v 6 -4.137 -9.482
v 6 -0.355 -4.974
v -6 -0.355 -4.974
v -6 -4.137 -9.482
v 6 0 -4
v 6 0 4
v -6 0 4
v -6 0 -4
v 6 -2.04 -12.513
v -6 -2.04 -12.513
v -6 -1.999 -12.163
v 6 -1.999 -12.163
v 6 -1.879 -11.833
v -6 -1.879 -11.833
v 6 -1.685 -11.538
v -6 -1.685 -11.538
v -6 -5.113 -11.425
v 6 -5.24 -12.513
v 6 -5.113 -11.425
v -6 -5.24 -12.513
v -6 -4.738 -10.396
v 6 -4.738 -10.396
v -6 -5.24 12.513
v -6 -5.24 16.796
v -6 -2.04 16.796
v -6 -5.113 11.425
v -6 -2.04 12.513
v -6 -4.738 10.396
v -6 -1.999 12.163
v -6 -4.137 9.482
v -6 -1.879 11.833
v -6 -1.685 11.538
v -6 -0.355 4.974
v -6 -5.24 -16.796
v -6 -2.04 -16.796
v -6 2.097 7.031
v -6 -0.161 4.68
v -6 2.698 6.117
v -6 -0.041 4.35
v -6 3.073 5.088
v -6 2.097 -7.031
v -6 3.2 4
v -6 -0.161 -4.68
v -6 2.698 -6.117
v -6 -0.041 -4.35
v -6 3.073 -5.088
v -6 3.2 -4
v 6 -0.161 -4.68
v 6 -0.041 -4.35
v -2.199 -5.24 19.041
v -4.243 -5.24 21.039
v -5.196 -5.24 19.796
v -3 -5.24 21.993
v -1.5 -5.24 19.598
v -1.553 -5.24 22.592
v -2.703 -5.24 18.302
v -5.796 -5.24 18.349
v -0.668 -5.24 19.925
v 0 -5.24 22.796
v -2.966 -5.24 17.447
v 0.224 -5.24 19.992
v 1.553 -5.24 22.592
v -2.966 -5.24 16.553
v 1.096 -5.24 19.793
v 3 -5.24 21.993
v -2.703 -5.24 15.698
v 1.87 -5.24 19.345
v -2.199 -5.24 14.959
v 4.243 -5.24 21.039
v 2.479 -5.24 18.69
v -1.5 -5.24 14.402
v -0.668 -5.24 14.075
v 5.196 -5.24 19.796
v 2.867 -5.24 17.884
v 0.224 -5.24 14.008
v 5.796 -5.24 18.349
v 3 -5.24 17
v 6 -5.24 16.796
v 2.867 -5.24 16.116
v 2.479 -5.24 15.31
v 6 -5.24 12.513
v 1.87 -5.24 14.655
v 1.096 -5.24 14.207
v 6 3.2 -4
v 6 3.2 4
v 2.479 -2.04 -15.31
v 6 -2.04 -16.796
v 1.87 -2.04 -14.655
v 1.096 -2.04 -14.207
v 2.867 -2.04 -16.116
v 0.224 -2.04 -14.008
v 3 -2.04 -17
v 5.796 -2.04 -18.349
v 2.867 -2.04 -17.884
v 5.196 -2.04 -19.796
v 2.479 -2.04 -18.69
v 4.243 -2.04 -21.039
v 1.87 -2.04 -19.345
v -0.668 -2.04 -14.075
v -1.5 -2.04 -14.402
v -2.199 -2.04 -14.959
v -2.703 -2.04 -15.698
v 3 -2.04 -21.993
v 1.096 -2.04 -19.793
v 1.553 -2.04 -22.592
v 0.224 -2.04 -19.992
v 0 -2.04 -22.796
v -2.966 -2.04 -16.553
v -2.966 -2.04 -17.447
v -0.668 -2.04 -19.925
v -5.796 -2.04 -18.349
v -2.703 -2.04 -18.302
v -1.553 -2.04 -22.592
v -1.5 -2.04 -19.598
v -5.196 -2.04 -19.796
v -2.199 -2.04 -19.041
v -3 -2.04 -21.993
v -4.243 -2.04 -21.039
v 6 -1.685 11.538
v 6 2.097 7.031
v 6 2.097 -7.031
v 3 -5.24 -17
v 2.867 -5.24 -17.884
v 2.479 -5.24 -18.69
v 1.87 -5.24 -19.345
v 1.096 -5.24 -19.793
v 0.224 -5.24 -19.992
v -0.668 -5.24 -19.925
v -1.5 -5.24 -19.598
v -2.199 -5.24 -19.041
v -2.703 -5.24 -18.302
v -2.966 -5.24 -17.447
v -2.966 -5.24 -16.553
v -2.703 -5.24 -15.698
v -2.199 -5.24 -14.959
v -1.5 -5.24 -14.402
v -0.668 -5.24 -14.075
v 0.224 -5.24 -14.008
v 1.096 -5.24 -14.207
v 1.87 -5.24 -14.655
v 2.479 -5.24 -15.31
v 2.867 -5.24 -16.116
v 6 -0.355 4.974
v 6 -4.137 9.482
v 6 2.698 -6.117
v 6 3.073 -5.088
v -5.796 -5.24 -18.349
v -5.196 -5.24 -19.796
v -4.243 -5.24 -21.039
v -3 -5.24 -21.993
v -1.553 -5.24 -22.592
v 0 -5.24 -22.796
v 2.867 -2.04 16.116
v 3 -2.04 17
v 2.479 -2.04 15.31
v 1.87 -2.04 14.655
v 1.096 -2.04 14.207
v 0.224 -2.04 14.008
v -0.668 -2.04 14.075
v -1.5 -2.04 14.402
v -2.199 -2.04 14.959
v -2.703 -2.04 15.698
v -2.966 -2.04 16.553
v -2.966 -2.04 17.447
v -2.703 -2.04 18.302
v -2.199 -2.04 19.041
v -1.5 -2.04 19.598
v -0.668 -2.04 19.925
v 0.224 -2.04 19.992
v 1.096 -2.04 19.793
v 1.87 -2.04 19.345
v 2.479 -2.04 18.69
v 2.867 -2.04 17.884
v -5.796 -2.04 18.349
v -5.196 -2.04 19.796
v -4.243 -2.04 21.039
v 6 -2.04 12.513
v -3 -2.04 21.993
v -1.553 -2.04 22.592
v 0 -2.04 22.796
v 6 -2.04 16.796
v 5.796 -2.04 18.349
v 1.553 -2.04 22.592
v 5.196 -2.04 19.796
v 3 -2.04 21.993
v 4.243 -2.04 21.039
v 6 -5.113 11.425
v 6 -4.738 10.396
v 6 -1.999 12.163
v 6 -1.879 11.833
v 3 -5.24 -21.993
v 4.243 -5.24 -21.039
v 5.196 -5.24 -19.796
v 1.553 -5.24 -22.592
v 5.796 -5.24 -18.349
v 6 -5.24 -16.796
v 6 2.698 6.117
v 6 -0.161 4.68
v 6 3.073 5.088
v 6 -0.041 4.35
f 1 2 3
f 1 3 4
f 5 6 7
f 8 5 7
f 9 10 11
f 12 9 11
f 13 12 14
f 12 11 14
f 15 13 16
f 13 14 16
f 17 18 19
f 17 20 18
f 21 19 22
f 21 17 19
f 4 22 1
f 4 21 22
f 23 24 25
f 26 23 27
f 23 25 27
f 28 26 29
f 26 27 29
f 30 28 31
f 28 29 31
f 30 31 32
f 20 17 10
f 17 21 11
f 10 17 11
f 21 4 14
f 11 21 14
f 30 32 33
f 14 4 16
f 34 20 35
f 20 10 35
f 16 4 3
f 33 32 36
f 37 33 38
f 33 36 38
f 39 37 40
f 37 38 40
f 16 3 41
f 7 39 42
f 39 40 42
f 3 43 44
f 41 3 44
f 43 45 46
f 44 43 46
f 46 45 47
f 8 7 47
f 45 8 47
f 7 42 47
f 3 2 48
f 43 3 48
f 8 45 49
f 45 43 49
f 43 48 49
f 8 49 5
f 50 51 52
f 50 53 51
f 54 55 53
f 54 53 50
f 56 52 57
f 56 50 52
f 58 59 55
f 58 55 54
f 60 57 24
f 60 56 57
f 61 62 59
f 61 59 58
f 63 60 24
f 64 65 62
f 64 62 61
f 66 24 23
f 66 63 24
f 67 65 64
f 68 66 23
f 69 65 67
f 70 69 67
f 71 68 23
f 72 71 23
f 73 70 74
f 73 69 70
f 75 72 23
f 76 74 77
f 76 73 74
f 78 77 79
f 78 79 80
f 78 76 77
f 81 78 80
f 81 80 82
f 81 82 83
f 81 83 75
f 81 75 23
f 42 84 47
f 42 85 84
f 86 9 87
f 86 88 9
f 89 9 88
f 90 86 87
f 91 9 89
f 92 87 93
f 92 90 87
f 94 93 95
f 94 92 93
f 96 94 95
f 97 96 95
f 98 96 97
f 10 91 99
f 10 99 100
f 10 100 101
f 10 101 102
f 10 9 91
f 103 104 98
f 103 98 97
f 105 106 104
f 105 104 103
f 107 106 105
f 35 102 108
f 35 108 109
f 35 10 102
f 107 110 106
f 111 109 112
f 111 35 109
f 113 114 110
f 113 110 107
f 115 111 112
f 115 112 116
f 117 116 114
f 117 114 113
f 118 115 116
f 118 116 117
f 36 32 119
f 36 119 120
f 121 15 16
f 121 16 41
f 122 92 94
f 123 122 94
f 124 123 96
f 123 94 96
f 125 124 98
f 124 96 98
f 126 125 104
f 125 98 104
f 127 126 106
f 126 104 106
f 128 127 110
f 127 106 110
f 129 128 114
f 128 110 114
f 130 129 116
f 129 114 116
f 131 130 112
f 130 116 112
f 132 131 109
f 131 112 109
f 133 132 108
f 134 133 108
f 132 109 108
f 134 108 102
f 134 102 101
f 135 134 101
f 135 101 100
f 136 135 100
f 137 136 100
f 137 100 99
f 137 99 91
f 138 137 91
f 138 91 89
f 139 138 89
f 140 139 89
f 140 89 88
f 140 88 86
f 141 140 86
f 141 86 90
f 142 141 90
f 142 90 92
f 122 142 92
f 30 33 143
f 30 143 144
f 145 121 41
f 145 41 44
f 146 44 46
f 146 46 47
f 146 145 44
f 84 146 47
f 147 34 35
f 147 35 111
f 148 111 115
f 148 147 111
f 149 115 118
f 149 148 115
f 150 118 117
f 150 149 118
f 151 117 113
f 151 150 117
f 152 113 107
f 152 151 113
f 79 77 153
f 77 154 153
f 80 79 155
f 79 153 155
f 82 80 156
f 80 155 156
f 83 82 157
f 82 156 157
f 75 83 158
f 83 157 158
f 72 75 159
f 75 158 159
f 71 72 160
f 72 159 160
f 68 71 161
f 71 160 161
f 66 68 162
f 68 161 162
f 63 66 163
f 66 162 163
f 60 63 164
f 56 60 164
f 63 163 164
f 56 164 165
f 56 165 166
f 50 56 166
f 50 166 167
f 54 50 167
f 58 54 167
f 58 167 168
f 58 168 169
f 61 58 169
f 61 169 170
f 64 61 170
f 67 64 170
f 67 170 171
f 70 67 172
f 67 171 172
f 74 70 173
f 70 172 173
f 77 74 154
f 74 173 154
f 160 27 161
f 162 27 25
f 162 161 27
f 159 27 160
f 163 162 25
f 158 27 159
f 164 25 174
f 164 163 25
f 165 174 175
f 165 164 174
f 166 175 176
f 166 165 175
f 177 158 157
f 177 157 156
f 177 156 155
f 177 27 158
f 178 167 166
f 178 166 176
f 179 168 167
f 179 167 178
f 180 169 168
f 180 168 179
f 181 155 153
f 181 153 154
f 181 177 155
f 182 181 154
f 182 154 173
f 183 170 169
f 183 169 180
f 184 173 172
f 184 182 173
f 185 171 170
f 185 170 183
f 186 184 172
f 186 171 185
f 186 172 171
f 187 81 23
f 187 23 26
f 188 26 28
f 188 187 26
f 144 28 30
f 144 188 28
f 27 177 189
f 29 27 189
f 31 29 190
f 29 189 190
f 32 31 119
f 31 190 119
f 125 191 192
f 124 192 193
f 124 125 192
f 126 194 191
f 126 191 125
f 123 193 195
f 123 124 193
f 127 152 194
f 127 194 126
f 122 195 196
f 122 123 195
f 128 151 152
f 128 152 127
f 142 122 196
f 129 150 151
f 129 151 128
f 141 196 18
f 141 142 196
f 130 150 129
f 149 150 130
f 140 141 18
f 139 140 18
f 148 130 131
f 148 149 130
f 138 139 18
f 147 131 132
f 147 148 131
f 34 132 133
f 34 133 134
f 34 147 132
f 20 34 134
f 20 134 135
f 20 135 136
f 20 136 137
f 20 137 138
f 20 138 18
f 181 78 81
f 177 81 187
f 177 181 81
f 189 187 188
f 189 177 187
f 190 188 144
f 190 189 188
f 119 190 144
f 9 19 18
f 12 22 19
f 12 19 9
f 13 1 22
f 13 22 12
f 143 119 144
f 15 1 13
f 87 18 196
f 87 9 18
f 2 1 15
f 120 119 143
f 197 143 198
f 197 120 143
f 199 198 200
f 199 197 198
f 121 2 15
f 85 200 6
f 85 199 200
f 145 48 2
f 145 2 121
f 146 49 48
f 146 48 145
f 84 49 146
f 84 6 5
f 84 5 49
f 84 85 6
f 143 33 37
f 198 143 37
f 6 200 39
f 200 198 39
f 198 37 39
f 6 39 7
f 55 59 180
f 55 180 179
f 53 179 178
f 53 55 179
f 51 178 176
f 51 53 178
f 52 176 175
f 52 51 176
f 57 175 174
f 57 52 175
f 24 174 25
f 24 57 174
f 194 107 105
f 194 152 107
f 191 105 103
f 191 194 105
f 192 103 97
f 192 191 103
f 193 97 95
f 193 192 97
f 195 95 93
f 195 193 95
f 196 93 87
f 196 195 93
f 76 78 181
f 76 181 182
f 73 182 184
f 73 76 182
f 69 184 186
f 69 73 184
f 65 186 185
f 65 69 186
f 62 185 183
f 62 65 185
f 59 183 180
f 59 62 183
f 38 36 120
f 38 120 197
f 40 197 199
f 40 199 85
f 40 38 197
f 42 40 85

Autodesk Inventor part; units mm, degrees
ref_plane "YZ Plane" through (0, 0, 0) normal (1, 0, 0) x (0, 1, 0)
ref_plane "XZ Plane" through (0, 0, 0) normal (0, 1, 0) x (-1, 0, 0)
ref_plane "XY Plane" through (0, 0, 0) normal (0, 0, 1) x (1, 0, 0)
sketch "Sketch1" plane through (0, 0, 0) normal (0, 1, 0) x (-1, 0, 0)
  line L0 (-6, 4) -> (6, 4)
  line L1 (6, 4) -> (6, -4)
  line L2 (6, -4) -> (-6, -4)
  line L3 (-6, -4) -> (-6, 4)
  line L4 (-6, 4) -> (6, -4) construction
  line L5 (6, 4) -> (-6, -4) construction
  point P0 (0, 0)
  dimension "d0" = 12
  dimension "d1" = 8
extrude "Plate1" add sketch "Sketch1" along normal blind 3.2
sketch "Sketch2" plane through (-6, -0.3547, -4.9745) normal (0, 0.7660444, -0.6427876) x (1, 0, 0)
  line L0 (12, 0) -> (0, 0)
  line L1 (0, 0) -> (0, -5.8835)
  line L2 (0, -5.8835) -> (12, -5.8835)
  line L3 (12, -5.8835) -> (12, 0)
edge flange "Flange1" height 7.6 angle 40 thickness 3.2 bend radius 1.516 thickness toward (0, 0.7660444, -0.6427876) relief tear relief width 3.2 relief depth 1.6 edges at (0, 3.2, -4) wall of the first edge with corners at (6, -0.3547, -4.9745) (-6, -0.3547, -4.9745) (-6, -4.1365, -9.4815) (6, -4.1365, -9.4815)
bend "Bend1"
corner "Corner1"
sketch "Sketch3" plane through (6, -2.0399, -12.5129) normal (0, -1, 0) x (-1, 0, 0)
  line L0 (12, 0) -> (0, 0)
  line L1 (0, 0) -> (0, -10.2835)
  line L2 (0, -10.2835) -> (12, -10.2835)
  line L3 (12, -10.2835) -> (12, 0)
edge flange "Flange2" height 12 angle 40 thickness 3.2 bend radius 1.516 thickness toward (0, -1, 0) relief tear relief width 3.2 relief depth 1.6 edges at (0, -4.1365, -9.4815) wall of the first edge with corners at (-6, -2.0399, -12.5129) (6, -2.0399, -12.5129) (6, -2.0399, -22.7964) (-6, -2.0399, -22.7964)
bend "Bend2"
corner "Corner2"
sketch "Sketch4" plane through (6, -0.3547, 4.9745) normal (0, 0.7660444, 0.6427876) x (1, 0, 0)
  line L0 (-12, 0) -> (0, 0)
  line L1 (0, 0) -> (0, 5.8835)
  line L2 (0, 5.8835) -> (-12, 5.8835)
  line L3 (-12, 5.8835) -> (-12, 0)
edge flange "Flange3" height 7.6 angle 40 thickness 3.2 bend radius 1.516 thickness toward (0, 0.7660444, 0.6427876) relief tear relief width 3.2 relief depth 1.6 edges at (0, 3.2, 4) wall of the first edge with corners at (-6, -0.3547, 4.9745) (6, -0.3547, 4.9745) (6, -4.1365, 9.4815) (-6, -4.1365, 9.4815)
bend "Bend3"
corner "Corner3"
sketch "Sketch5" plane through (-6, -2.0399, 12.5129) normal (0, -1, 0) x (-1, 0, 0)
  line L0 (-12, 0) -> (0, 0)
  line L1 (0, 0) -> (0, 10.2835)
  line L2 (0, 10.2835) -> (-12, 10.2835)
  line L3 (-12, 10.2835) -> (-12, 0)
edge flange "Flange4" height 12 angle 40 thickness 3.2 bend radius 1.516 thickness toward (0, -1, 0) relief tear relief width 3.2 relief depth 1.6 edges at (0, -4.1365, 9.4815) wall of the first edge with corners at (6, -2.0399, 12.5129) (-6, -2.0399, 12.5129) (-6, -2.0399, 22.7964) (6, -2.0399, 22.7964)
bend "Bend4"
corner "Corner4"
fillet "Fillet1" radius 6 4 edges at (6, -3.6399, -22.7964) (-6, -3.6399, -22.7964) (6, -3.6399, 22.7964) (-6, -3.6399, 22.7964)
sketch "Sketch6" plane through (-6, -2.0399, 12.5129) normal (0, 1, 0) x (1, 0, 0)
  arc A0 (0, -4.2835) -> (12, -4.2835) centre (6, -4.2835) ccw projected
  line L0 (6, -10.2835) -> (6, 35.3093)
  arc A1 (12, 29.3093) -> (0, 29.3093) centre (6, 29.3093) ccw projected
  line L1 (6, 12.5129) -> (6, -4.4871)
  circle A2 centre (6, -4.4871) radius 3
  line L2 (6, 12.5129) -> (6, 29.5129)
  circle A3 centre (6, 29.5129) radius 3
  dimension "d50" = 17
  dimension "d51" = 6
  dimension "d52" = 17
  dimension "d53" = 6
extrude "Cut1" cut sketch "Sketch6" against normal blind 3.2
equation "\"d54\" = Thickness"
equation "\"d2\" = Thickness"
equation "\"d3\" = BendReliefWidth"
equation "\"d4\" = BendReliefDepth"
equation "\"d5\" = MinimumRemnant"
equation "\"d6\" = TransitionRadius"
equation "\"d9\" = BendRadius"
equation "\"d10\" = CornerReliefSize"
equation "\"d11\" = GapSize"
equation "\"d12\" = JacobiRadiusSize"
equation "\"d13\" = BendReliefWidth"
equation "\"d14\" = BendReliefDepth"
equation "\"d15\" = MinimumRemnant"
equation "\"d16\" = TransitionRadius"
equation "\"d19\" = BendRadius"
equation "\"d20\" = CornerReliefSize"
equation "\"d21\" = GapSize"
equation "\"d22\" = JacobiRadiusSize"
equation "\"d23\" = BendReliefWidth"
equation "\"d24\" = BendReliefDepth"
equation "\"d25\" = MinimumRemnant"
equation "\"d26\" = TransitionRadius"
equation "\"d29\" = BendRadius"
equation "\"d30\" = CornerReliefSize"
equation "\"d31\" = GapSize"
equation "\"d32\" = JacobiRadiusSize"
equation "\"d33\" = BendReliefWidth"
equation "\"d34\" = BendReliefDepth"
equation "\"d35\" = MinimumRemnant"
equation "\"d36\" = TransitionRadius"
equation "\"d39\" = BendRadius"
equation "\"d40\" = CornerReliefSize"
equation "\"d41\" = GapSize"
equation "\"d42\" = JacobiRadiusSize"
equation "\"BendReliefWidth\" = Thickness"
equation "\"BendReliefDepth\" = 0.5 * Thickness"
equation "\"CornerReliefSize\" = 4 * Thickness"
equation "\"MinimumRemnant\" = 2 * Thickness"
equation "\"TransitionRadius\" = BendRadius"
equation "\"JacobiRadiusSize\" = BendRadius"
equation "\"GapSize\" = Thickness"
equation "\"Thickness\" = 3.2"
equation "\"BendRadius\" = 1.516"
properties part number "SP7V1 Viela Freno" material "Stainless Steel"
